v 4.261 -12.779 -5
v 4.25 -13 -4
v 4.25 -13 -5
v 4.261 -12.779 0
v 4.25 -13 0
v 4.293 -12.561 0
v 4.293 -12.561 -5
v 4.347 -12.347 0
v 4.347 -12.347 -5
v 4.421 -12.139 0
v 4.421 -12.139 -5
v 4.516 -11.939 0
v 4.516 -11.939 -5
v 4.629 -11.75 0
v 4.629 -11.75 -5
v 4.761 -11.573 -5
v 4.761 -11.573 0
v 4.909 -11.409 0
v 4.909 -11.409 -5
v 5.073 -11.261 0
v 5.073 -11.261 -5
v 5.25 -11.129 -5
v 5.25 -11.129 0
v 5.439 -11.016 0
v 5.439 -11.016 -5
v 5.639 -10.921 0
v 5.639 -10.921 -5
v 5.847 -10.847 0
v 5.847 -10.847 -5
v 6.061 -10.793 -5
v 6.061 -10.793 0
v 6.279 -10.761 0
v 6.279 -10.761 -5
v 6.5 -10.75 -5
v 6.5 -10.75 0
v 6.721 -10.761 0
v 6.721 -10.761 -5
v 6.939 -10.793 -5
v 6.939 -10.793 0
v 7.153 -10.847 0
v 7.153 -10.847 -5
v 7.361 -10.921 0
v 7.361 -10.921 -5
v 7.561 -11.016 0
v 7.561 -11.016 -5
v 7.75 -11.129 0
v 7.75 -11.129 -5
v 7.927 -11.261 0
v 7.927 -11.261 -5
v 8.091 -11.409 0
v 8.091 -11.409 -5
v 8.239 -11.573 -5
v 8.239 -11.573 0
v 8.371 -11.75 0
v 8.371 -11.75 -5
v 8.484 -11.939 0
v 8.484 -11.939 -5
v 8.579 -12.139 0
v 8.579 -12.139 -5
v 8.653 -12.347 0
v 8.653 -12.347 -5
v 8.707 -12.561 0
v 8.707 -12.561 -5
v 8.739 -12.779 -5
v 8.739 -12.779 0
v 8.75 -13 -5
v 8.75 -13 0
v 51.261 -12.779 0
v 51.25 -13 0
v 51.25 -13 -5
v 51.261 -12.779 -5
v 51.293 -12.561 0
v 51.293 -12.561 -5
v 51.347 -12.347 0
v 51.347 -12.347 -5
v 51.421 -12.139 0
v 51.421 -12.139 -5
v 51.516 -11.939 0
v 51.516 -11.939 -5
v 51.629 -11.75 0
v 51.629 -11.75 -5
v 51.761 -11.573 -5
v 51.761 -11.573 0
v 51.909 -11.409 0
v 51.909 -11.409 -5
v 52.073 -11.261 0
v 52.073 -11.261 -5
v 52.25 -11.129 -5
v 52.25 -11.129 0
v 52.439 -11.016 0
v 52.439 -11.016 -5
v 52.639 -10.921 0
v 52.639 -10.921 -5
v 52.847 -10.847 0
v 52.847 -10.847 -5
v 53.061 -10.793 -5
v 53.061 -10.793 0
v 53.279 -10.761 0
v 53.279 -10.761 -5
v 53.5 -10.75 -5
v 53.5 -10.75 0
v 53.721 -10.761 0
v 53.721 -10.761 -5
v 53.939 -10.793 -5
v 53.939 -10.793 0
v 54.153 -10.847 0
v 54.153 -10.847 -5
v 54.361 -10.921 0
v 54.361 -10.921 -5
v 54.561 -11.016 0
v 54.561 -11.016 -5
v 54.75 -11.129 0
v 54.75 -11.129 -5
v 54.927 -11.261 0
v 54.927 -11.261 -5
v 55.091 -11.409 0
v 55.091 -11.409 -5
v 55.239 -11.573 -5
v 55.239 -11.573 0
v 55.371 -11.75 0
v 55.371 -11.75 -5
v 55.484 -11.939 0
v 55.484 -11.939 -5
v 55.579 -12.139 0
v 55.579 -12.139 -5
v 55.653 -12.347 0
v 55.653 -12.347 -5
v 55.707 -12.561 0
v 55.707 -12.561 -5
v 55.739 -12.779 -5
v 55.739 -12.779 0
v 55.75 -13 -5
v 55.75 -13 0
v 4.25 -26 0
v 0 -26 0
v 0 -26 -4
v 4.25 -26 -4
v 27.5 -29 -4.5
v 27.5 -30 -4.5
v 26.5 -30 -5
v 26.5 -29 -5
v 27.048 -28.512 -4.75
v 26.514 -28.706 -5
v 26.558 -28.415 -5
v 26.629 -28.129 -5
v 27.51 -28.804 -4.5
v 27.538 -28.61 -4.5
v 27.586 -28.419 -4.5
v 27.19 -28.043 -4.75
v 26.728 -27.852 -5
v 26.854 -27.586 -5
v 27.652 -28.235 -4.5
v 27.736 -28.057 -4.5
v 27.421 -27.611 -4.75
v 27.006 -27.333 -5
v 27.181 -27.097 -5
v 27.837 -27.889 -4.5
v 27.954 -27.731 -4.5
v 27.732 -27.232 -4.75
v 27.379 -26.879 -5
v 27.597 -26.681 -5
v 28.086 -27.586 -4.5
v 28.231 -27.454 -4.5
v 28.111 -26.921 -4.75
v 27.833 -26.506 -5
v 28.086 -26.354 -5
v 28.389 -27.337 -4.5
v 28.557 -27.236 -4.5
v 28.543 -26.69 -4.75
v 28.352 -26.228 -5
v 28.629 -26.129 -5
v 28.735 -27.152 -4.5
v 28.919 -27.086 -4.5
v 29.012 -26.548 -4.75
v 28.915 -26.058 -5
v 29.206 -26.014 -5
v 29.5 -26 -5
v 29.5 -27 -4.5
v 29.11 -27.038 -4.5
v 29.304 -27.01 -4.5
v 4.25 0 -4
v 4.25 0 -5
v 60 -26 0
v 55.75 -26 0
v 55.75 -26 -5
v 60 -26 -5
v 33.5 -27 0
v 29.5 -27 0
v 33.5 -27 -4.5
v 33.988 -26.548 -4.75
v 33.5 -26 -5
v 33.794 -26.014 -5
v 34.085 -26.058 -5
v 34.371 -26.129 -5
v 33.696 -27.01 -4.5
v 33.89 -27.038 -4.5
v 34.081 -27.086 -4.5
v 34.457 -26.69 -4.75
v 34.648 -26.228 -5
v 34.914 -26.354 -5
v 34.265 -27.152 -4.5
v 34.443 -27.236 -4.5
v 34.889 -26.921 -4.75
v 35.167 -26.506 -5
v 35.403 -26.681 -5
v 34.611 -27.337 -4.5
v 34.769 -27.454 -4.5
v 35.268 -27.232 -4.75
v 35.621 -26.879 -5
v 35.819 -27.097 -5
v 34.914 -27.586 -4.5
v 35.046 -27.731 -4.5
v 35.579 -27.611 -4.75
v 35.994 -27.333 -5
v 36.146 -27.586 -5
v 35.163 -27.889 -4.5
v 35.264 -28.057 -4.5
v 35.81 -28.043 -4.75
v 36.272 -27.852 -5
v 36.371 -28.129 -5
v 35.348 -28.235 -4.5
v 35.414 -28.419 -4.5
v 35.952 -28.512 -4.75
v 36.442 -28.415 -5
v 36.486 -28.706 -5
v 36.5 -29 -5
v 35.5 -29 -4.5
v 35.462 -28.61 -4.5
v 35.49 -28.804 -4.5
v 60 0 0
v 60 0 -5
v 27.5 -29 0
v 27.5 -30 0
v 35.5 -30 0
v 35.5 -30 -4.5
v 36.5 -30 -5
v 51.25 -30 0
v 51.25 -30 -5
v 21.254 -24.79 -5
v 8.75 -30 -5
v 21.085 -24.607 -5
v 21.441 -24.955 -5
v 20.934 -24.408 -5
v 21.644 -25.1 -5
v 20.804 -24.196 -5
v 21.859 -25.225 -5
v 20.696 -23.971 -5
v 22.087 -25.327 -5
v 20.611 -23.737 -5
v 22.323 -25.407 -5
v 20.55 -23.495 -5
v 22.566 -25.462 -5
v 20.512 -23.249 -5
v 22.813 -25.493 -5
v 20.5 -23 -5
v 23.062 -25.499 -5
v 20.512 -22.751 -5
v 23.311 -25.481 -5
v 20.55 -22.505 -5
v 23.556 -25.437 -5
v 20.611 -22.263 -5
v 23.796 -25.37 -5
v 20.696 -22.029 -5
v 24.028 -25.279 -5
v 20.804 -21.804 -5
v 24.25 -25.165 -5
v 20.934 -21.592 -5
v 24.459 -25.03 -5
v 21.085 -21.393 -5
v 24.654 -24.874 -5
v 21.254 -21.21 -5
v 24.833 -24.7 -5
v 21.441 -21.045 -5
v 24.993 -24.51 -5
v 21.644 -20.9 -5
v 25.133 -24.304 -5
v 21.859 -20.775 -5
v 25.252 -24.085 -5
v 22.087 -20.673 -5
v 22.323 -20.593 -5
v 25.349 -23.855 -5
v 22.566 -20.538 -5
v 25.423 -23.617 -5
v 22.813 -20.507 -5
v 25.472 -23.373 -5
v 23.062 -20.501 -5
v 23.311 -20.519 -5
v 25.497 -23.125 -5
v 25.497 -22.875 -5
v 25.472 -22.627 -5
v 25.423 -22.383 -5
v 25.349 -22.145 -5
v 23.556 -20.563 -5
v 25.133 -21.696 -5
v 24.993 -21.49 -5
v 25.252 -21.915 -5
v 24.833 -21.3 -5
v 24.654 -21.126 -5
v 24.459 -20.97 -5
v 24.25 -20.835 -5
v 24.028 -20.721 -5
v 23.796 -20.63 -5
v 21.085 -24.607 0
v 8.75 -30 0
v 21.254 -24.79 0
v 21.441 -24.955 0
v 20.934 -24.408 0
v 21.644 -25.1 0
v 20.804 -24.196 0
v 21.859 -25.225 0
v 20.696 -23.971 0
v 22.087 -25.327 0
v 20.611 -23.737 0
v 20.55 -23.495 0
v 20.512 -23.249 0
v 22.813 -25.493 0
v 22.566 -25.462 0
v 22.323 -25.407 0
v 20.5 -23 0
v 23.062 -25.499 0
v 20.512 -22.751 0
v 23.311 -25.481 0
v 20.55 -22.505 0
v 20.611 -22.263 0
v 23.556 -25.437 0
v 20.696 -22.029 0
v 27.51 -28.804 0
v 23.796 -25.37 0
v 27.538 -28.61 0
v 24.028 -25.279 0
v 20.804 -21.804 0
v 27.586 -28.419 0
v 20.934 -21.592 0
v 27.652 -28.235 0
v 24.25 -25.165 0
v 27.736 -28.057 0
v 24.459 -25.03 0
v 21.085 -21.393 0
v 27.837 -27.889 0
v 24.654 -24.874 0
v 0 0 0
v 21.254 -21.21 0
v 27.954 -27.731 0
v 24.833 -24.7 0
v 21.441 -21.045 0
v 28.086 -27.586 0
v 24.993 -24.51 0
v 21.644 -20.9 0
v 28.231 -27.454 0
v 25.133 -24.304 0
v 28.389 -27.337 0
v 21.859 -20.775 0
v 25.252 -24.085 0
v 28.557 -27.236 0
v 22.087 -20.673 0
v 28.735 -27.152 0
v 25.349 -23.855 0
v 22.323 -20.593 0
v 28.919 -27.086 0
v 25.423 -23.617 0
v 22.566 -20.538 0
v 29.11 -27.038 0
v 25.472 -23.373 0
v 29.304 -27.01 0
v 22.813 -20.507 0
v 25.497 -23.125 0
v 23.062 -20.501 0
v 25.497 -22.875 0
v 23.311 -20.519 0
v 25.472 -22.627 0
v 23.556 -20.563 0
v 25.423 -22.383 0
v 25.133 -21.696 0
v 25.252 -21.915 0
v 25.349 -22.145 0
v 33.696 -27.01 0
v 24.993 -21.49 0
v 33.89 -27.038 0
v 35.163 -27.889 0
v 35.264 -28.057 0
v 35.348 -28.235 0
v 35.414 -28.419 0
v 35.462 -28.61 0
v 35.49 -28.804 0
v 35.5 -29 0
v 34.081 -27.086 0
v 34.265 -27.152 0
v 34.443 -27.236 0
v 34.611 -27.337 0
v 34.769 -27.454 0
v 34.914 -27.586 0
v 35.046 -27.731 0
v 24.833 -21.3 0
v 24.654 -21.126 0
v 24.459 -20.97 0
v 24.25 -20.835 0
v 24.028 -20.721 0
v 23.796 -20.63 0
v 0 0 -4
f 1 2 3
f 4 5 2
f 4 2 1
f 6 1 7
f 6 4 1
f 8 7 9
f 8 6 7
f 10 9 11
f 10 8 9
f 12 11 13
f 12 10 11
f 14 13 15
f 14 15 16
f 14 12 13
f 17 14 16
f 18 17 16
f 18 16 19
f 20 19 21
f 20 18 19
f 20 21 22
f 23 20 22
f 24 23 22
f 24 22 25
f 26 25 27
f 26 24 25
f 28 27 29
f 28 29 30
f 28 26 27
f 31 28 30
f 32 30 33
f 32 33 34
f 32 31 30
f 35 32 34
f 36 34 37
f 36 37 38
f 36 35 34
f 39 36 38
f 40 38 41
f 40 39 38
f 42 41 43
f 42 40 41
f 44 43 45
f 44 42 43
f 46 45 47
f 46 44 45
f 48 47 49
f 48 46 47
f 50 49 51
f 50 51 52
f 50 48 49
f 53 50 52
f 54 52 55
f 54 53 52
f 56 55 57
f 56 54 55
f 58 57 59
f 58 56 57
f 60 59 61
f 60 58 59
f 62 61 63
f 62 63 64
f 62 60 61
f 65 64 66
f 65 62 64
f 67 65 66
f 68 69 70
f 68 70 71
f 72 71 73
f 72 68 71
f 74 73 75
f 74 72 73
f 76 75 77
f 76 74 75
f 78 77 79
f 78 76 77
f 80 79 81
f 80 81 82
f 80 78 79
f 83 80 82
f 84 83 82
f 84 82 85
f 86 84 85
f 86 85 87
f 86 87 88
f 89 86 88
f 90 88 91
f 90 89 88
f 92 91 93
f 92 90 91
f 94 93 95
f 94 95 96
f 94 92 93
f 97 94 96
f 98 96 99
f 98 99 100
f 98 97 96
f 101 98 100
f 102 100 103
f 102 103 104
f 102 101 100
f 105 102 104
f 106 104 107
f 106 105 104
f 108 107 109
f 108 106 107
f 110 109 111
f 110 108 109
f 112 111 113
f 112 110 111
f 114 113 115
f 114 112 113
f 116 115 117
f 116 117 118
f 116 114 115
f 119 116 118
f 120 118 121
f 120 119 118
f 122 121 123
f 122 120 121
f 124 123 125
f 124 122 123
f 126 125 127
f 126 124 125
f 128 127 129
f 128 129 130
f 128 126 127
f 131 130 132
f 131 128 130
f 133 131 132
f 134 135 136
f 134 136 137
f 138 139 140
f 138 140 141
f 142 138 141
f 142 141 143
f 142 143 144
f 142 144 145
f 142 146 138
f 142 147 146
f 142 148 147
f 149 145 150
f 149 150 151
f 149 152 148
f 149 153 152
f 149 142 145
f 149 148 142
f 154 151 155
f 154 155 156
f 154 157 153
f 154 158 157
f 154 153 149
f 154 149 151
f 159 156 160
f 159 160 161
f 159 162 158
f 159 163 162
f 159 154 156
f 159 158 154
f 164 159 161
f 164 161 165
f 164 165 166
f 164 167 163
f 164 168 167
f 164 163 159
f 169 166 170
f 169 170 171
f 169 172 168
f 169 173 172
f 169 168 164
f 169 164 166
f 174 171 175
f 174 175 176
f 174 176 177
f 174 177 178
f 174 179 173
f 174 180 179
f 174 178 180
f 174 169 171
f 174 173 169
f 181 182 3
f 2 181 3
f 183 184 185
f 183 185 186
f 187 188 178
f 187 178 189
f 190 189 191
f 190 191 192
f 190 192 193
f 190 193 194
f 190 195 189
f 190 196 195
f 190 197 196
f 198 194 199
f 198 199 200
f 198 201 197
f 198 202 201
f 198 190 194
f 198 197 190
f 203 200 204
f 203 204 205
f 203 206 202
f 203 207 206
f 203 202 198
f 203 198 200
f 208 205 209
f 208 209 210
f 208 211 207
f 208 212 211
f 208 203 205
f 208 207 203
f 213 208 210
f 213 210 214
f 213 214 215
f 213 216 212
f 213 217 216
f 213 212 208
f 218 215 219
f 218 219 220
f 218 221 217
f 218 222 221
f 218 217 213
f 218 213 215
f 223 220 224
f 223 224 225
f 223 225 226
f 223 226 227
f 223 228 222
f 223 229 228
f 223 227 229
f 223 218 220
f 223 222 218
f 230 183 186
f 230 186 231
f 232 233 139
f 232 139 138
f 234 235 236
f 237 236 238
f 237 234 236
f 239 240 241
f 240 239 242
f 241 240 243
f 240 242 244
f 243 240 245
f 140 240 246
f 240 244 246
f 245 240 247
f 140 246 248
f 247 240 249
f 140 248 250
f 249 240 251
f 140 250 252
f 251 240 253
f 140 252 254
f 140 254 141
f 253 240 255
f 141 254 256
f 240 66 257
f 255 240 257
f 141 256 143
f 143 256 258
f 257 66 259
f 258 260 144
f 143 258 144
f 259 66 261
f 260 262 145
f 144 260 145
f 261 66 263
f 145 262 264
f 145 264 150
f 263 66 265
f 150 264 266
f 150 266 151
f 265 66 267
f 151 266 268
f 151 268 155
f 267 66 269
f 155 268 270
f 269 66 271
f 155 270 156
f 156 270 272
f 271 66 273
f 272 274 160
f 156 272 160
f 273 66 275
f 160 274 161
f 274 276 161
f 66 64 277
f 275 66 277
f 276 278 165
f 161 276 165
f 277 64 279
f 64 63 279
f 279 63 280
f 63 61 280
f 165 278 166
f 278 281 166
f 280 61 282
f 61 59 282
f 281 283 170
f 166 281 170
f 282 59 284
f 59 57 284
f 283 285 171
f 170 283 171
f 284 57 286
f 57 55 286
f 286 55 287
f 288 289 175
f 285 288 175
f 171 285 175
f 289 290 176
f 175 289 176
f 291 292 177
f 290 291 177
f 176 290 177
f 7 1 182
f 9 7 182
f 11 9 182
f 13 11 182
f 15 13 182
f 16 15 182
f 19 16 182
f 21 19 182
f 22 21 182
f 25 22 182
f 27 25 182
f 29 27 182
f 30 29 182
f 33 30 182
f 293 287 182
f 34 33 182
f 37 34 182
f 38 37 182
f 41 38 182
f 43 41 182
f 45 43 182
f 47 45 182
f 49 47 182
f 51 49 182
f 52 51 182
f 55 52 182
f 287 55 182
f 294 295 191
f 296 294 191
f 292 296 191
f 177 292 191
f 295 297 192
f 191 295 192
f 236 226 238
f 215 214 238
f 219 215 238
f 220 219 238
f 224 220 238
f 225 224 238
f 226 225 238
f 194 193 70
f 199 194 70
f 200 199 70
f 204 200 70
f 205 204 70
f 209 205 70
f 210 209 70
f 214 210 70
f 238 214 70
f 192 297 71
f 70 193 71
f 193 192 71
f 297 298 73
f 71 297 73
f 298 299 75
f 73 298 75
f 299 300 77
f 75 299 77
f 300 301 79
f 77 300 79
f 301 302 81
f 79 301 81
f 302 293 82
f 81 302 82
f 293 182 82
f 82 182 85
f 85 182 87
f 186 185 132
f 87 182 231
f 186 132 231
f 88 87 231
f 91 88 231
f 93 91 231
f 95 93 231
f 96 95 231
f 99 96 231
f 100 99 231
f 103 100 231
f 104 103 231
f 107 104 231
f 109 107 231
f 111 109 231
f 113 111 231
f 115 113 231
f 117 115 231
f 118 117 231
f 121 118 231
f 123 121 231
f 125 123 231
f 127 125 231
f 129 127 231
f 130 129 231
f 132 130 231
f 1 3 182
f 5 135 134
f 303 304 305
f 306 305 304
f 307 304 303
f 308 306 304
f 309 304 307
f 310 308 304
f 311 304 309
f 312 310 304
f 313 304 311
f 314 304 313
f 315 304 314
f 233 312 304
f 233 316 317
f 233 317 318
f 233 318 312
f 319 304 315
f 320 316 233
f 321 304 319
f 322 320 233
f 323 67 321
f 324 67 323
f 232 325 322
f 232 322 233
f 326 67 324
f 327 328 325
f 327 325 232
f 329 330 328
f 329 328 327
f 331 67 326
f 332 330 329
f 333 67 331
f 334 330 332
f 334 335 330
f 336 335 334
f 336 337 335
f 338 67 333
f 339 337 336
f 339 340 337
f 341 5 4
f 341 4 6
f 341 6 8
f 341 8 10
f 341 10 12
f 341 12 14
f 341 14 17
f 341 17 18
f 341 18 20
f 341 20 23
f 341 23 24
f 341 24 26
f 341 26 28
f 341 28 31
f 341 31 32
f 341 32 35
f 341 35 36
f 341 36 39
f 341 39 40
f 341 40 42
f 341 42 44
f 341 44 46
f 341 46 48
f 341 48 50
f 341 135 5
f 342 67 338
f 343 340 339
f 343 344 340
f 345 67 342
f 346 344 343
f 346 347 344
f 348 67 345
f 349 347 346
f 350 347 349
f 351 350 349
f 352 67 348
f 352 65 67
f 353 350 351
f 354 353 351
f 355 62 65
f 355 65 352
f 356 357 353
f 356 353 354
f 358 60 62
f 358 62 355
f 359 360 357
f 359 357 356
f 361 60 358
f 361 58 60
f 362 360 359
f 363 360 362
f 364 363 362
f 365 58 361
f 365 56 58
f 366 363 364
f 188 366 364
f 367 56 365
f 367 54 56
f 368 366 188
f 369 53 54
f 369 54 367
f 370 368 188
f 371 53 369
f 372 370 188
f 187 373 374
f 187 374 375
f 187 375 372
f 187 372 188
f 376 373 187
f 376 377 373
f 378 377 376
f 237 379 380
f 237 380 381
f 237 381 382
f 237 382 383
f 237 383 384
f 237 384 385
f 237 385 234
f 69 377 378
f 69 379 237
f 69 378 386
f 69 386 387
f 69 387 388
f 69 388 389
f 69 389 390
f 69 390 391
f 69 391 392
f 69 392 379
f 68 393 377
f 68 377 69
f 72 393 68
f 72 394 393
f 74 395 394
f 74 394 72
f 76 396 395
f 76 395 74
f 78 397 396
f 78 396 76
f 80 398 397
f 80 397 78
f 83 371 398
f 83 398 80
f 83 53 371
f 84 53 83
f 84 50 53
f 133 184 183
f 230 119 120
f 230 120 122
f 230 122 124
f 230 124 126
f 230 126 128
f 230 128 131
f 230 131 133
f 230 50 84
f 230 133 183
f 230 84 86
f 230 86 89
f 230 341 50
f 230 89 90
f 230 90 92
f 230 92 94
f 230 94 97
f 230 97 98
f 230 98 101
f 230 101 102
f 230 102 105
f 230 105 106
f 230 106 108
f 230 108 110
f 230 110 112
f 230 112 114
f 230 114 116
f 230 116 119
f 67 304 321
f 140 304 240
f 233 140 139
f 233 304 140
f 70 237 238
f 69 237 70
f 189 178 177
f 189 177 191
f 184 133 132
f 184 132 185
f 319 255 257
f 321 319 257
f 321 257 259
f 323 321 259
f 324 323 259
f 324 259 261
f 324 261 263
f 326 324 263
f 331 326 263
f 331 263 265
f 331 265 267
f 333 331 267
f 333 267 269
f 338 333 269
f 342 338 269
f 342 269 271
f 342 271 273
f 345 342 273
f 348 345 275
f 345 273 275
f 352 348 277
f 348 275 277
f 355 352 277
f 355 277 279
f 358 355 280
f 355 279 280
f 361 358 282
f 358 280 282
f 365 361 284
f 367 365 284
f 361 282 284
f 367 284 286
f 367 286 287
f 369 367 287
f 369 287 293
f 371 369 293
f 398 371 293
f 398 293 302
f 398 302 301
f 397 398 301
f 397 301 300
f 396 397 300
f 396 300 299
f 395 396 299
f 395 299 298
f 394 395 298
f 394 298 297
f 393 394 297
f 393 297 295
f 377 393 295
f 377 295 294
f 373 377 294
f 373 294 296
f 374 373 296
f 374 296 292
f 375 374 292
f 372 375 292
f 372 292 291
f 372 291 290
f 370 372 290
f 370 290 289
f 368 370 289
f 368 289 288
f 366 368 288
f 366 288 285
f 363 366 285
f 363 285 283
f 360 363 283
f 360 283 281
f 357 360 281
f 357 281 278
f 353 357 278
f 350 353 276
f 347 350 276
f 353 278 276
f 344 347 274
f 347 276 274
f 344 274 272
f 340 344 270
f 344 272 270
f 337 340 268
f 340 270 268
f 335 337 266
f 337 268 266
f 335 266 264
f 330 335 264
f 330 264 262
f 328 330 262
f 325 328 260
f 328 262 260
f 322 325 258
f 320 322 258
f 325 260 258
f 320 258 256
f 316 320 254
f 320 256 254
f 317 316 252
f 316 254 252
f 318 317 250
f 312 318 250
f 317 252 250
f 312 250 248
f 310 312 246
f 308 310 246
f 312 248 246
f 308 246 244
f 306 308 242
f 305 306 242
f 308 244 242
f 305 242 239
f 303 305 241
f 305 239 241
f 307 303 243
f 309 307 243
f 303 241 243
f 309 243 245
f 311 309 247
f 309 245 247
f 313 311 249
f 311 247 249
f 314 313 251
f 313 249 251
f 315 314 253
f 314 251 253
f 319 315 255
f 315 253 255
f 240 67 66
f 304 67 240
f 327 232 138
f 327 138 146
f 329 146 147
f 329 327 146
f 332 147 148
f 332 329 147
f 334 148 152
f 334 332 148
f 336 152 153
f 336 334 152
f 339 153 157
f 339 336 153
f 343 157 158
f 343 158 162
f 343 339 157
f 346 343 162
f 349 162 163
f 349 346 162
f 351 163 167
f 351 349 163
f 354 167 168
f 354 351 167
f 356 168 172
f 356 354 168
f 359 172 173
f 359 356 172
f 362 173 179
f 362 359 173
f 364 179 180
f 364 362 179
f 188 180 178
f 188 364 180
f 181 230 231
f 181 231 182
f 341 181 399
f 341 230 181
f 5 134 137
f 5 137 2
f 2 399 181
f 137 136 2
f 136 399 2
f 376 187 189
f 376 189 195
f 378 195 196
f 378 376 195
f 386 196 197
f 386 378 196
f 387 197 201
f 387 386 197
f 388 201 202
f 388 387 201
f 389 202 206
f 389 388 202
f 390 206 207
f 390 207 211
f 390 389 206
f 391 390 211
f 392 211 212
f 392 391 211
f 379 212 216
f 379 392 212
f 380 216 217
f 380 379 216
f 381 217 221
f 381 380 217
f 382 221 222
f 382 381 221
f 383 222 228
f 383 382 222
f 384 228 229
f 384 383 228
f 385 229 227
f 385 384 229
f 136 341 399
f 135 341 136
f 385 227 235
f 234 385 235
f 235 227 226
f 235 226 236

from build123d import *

# Parameters (mm, degrees)
F1_DEPTH = 5
F2_D     = 5
F3_SIZE2 = 0.5
F3_SIZE  = 1
F4_W     = 4.25
F4_H     = 26
F5_DEPTH = 1


with BuildPart() as f1:
    # F0 (on Top) → F1 (new body)
    with BuildSketch(Plane.XY):
        with BuildLine():
            Line((60, 0), (0, 0))
            Line((0, 0), (0, -26))
            Line((0, -26), (4.25, -26))
            Line((4.25, -26), (4.25, -13))
            ThreePointArc((4.25, -13), (6.5, -10.75), (8.75, -13))
            Line((8.75, -13), (8.75, -30))
            Line((8.75, -30), (27.5, -30))
            Line((27.5, -30), (27.5, -29))
            ThreePointArc((27.5, -29), (28.0857864376, -27.5857864376), (29.5, -27))
            Line((29.5, -27), (33.5, -27))
            ThreePointArc((33.5, -27), (34.9142135624, -27.5857864376), (35.5, -29))
            Line((35.5, -29), (35.5, -30))
            Line((35.5, -30), (51.25, -30))
            Line((51.25, -30), (51.25, -13))
            ThreePointArc((51.25, -13), (53.5, -10.75), (55.75, -13))
            Line((55.75, -13), (55.75, -26))
            Line((55.75, -26), (60, -26))
            Line((60, -26), (60, 0))
        make_face()
    extrude(amount=-F1_DEPTH)

    # F2 (through all)
    with Locations(Plane.XY):
        with Locations((23, -23)):
            Hole(F2_D / 2)

    # F3
    f3_edges = [f1.edges().sort_by_distance(p)[0] for p in [
        (31.5, -27, -5),
    ]]
    f3_side = f1.faces().sort_by_distance((30.066886, -13.81093, -5))[0]
    chamfer(f3_edges, length=F3_SIZE, length2=F3_SIZE2, reference=f3_side)

    # F4 (on face) → F5 (cut)
    with BuildSketch(Plane(origin=(0, 0, -5), x_dir=(1, 0, 0), z_dir=(0, 0, -1))):
        with Locations((2.125, 13)):
            Rectangle(F4_W, F4_H)
    extrude(amount=-F5_DEPTH, mode=Mode.SUBTRACT)


solid = f1.part
